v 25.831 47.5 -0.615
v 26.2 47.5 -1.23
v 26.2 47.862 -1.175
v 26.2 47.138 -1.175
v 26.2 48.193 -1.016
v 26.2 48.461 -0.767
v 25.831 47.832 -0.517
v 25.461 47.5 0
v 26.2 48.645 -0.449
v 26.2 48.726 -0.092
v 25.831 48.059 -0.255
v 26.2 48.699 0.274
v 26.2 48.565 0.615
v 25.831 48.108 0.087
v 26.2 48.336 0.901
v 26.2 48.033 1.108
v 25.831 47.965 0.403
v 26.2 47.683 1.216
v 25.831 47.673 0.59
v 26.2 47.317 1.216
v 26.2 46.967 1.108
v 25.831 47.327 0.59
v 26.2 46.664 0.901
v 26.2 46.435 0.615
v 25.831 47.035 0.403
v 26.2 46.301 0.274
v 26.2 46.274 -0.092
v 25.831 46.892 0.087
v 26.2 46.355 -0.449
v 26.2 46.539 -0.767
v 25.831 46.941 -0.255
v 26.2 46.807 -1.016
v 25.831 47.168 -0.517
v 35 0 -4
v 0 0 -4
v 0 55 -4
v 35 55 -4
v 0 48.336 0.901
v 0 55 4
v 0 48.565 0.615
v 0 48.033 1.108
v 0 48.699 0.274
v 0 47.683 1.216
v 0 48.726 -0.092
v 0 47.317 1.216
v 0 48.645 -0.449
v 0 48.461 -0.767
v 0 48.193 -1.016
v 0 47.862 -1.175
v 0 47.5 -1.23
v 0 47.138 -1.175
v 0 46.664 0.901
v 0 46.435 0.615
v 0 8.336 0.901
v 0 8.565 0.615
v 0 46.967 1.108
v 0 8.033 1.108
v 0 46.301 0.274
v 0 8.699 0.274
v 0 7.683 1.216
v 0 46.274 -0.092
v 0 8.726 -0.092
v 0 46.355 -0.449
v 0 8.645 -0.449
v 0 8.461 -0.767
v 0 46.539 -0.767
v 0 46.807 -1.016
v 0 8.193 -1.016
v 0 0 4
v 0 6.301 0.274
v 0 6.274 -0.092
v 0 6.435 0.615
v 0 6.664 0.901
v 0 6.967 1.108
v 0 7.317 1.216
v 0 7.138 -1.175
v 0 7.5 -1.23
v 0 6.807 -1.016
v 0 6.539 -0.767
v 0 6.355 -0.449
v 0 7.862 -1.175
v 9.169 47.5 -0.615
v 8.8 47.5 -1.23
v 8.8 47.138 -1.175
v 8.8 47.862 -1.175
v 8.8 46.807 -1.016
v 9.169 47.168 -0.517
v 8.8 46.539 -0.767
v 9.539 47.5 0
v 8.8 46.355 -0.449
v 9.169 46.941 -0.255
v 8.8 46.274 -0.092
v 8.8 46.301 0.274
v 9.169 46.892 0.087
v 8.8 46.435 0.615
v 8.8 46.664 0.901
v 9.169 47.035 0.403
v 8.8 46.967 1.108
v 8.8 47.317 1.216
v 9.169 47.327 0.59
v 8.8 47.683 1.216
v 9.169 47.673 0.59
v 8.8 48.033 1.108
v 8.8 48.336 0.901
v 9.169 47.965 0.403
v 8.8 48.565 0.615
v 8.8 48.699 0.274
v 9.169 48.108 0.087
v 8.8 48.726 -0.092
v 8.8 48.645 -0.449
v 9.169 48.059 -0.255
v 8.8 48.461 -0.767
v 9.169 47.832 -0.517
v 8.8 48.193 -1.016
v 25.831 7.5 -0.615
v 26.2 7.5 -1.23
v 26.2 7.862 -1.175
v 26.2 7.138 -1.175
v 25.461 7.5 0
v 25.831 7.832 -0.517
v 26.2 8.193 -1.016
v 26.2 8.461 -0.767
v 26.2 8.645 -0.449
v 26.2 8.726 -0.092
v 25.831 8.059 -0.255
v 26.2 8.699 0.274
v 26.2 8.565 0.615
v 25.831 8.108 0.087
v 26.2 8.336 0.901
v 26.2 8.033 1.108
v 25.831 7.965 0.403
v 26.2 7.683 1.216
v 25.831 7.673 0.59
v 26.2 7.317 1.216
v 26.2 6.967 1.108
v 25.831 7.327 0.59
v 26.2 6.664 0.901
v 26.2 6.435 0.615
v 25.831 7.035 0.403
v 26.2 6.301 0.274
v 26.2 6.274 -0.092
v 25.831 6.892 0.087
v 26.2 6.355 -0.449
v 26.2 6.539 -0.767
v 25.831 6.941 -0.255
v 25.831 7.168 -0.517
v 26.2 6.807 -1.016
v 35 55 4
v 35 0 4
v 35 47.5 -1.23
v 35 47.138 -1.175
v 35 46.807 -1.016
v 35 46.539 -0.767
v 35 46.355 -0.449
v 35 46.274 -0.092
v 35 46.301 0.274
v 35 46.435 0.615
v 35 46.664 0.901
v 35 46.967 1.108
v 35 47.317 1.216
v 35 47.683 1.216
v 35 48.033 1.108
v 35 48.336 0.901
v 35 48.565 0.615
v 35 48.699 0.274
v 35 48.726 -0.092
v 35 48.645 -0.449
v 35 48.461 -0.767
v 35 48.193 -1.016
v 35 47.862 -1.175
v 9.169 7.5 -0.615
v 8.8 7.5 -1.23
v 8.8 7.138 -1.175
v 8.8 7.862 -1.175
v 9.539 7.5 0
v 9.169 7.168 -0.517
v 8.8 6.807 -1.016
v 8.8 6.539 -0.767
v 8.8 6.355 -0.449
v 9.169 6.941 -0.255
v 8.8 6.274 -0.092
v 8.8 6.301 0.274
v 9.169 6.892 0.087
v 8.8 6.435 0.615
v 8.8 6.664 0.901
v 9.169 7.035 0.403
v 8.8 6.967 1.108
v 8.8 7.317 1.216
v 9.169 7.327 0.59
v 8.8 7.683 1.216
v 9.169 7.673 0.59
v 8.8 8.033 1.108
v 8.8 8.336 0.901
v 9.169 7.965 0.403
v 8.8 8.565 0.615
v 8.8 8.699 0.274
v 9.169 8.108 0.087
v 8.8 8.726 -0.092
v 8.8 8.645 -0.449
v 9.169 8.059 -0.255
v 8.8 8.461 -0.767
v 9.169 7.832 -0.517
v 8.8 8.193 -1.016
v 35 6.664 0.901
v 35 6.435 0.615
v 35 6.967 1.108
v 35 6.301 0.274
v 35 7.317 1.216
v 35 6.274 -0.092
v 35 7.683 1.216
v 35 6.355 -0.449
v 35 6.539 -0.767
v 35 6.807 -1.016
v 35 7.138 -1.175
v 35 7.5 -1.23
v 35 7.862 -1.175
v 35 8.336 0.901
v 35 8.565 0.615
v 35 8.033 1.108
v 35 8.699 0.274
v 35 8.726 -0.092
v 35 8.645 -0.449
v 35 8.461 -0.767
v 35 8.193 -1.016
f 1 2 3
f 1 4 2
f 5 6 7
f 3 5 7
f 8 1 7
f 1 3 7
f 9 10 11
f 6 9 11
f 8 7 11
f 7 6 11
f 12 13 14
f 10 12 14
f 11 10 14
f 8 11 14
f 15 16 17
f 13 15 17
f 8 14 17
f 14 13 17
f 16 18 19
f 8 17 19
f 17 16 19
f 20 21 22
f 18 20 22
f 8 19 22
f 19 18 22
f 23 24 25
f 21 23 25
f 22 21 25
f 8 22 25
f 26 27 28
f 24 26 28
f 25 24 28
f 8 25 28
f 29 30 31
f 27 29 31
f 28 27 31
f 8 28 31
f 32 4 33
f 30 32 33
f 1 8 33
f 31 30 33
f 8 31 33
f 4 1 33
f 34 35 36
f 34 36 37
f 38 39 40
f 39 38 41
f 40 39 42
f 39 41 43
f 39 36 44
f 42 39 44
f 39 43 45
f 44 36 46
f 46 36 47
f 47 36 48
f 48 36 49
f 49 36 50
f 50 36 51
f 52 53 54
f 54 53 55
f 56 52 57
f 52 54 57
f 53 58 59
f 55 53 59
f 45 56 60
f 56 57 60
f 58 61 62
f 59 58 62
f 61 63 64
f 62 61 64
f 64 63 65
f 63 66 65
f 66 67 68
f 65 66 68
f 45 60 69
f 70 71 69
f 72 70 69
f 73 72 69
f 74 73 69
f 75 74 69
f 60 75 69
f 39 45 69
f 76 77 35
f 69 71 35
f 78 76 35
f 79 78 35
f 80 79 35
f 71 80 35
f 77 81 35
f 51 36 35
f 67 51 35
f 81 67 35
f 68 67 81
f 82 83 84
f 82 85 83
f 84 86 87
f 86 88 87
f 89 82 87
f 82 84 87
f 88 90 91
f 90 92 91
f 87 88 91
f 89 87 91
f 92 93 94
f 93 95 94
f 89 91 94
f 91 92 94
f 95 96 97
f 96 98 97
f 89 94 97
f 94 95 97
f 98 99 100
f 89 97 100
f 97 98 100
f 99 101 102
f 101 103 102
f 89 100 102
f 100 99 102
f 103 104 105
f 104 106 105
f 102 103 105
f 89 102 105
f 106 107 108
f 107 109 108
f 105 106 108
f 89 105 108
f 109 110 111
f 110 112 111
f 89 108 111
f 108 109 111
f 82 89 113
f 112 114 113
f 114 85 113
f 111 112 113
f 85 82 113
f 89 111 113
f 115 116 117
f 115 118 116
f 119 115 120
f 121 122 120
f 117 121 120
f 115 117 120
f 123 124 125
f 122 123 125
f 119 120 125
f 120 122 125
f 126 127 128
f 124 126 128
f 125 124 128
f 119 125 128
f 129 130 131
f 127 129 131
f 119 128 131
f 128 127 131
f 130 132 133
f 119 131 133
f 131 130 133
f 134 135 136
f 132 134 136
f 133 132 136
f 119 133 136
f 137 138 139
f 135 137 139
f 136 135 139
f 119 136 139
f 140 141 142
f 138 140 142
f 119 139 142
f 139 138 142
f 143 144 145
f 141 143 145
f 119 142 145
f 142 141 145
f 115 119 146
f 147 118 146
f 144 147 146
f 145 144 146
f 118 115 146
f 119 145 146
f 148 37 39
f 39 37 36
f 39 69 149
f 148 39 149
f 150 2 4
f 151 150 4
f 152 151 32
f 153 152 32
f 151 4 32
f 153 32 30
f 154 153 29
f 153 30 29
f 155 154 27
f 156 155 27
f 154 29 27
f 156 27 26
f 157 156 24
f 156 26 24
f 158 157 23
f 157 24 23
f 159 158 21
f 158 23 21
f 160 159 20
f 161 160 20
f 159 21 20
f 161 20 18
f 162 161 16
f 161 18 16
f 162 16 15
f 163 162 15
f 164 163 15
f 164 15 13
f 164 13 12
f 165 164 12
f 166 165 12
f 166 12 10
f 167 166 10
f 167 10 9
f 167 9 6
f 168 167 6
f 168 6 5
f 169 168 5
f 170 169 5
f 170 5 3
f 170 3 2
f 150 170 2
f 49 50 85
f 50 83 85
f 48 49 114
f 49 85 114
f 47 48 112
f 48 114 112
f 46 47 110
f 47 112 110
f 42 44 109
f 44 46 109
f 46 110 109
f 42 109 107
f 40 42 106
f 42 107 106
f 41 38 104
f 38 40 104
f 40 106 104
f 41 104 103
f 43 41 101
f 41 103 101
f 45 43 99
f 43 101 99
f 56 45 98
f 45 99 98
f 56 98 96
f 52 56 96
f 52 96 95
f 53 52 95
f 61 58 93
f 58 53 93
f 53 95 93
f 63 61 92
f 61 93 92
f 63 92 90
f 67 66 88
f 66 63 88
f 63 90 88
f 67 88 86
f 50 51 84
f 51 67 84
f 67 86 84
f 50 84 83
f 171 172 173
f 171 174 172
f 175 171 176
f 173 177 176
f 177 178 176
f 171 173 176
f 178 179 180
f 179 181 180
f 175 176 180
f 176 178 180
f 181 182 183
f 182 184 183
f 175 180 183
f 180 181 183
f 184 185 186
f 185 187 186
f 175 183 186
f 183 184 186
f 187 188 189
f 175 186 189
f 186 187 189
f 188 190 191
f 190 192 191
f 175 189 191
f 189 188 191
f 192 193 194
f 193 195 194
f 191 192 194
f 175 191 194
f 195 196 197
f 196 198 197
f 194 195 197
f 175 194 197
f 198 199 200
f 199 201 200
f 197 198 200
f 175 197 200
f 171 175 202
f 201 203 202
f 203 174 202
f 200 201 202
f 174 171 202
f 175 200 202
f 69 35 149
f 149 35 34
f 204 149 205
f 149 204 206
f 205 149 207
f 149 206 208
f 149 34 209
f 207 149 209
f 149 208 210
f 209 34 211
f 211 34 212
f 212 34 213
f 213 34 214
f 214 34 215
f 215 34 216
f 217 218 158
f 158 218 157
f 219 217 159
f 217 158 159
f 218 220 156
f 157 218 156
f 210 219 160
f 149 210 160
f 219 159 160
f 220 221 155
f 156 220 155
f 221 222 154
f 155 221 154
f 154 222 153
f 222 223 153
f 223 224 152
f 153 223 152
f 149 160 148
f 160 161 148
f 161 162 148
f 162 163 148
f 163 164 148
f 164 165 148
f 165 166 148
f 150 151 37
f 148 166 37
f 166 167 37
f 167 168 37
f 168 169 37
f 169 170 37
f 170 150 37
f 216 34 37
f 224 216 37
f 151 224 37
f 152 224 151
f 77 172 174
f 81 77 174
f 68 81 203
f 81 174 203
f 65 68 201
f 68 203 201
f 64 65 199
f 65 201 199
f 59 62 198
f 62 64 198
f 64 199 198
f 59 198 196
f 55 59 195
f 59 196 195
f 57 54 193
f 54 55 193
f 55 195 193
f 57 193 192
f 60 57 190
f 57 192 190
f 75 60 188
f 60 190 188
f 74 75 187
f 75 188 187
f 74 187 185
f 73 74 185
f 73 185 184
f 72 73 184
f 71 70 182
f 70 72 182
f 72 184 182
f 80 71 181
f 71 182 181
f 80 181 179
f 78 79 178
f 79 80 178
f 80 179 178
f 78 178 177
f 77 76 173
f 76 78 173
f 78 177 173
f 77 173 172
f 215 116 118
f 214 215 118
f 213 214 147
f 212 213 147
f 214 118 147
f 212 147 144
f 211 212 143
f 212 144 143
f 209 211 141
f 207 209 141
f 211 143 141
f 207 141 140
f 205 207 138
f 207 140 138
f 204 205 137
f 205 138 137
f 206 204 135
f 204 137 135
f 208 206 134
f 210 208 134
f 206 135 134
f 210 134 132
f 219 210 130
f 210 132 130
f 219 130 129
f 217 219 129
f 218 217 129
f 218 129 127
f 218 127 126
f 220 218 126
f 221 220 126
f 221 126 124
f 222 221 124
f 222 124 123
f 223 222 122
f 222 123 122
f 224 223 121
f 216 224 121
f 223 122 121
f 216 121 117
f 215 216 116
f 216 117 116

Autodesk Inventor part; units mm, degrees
ref_plane "YZ Plane" through (0, 0, 0) normal (1, 0, 0) x (0, 1, 0)
ref_plane "XZ Plane" through (0, 0, 0) normal (0, 1, 0) x (-1, 0, 0)
sketch "Sketch1" plane through (0, 0, 0) normal (0, 0, 1) x (1, 0, 0)
  line L0 (0, 0) -> (35, 0)
  line L1 (35, 0) -> (35, 55)
  line L2 (35, 55) -> (0, 55)
  line L3 (0, 55) -> (0, 0)
  dimension "d0" = 35
  dimension "d1" = 55
extrude "Extrusion1" add sketch "Sketch1" along normal mid plane 8
sketch "Sketch2" plane through (35, 0, 4) normal (1, 0, 0) x (0, 0, -1)
  line L0 (8, 55) -> (0, 55) projected
  point P0 (4, 0)
  point P1 (4, 7.5)
  point P2 (4, 47.5)
  point P3 (4, 55)
  dimension "d4" = 7.5
  dimension "d5" = 7.5
  dimension "d6" = 40
hole "Hole1" at (35, 7.5, 0) at (35, 47.5, 0) direction (-1, 0, 0) diameter 2.459 depth 8.8 tip angle 118 thread size "M3x0.5" class "6H" standard "ANSI Metric M Profile"
ref_plane "Work Plane1" through (17.5, 0, 4) normal (1, 0, 0) x (0, 0, -1)
mirror "Mirror1" about plane through (17.5, 0, 4) normal (1, 0, 0) of "Hole1"
equation "\"d5\" = d4"
properties part number "Pancake_Floor Piece" material "Aluminum 6061"
